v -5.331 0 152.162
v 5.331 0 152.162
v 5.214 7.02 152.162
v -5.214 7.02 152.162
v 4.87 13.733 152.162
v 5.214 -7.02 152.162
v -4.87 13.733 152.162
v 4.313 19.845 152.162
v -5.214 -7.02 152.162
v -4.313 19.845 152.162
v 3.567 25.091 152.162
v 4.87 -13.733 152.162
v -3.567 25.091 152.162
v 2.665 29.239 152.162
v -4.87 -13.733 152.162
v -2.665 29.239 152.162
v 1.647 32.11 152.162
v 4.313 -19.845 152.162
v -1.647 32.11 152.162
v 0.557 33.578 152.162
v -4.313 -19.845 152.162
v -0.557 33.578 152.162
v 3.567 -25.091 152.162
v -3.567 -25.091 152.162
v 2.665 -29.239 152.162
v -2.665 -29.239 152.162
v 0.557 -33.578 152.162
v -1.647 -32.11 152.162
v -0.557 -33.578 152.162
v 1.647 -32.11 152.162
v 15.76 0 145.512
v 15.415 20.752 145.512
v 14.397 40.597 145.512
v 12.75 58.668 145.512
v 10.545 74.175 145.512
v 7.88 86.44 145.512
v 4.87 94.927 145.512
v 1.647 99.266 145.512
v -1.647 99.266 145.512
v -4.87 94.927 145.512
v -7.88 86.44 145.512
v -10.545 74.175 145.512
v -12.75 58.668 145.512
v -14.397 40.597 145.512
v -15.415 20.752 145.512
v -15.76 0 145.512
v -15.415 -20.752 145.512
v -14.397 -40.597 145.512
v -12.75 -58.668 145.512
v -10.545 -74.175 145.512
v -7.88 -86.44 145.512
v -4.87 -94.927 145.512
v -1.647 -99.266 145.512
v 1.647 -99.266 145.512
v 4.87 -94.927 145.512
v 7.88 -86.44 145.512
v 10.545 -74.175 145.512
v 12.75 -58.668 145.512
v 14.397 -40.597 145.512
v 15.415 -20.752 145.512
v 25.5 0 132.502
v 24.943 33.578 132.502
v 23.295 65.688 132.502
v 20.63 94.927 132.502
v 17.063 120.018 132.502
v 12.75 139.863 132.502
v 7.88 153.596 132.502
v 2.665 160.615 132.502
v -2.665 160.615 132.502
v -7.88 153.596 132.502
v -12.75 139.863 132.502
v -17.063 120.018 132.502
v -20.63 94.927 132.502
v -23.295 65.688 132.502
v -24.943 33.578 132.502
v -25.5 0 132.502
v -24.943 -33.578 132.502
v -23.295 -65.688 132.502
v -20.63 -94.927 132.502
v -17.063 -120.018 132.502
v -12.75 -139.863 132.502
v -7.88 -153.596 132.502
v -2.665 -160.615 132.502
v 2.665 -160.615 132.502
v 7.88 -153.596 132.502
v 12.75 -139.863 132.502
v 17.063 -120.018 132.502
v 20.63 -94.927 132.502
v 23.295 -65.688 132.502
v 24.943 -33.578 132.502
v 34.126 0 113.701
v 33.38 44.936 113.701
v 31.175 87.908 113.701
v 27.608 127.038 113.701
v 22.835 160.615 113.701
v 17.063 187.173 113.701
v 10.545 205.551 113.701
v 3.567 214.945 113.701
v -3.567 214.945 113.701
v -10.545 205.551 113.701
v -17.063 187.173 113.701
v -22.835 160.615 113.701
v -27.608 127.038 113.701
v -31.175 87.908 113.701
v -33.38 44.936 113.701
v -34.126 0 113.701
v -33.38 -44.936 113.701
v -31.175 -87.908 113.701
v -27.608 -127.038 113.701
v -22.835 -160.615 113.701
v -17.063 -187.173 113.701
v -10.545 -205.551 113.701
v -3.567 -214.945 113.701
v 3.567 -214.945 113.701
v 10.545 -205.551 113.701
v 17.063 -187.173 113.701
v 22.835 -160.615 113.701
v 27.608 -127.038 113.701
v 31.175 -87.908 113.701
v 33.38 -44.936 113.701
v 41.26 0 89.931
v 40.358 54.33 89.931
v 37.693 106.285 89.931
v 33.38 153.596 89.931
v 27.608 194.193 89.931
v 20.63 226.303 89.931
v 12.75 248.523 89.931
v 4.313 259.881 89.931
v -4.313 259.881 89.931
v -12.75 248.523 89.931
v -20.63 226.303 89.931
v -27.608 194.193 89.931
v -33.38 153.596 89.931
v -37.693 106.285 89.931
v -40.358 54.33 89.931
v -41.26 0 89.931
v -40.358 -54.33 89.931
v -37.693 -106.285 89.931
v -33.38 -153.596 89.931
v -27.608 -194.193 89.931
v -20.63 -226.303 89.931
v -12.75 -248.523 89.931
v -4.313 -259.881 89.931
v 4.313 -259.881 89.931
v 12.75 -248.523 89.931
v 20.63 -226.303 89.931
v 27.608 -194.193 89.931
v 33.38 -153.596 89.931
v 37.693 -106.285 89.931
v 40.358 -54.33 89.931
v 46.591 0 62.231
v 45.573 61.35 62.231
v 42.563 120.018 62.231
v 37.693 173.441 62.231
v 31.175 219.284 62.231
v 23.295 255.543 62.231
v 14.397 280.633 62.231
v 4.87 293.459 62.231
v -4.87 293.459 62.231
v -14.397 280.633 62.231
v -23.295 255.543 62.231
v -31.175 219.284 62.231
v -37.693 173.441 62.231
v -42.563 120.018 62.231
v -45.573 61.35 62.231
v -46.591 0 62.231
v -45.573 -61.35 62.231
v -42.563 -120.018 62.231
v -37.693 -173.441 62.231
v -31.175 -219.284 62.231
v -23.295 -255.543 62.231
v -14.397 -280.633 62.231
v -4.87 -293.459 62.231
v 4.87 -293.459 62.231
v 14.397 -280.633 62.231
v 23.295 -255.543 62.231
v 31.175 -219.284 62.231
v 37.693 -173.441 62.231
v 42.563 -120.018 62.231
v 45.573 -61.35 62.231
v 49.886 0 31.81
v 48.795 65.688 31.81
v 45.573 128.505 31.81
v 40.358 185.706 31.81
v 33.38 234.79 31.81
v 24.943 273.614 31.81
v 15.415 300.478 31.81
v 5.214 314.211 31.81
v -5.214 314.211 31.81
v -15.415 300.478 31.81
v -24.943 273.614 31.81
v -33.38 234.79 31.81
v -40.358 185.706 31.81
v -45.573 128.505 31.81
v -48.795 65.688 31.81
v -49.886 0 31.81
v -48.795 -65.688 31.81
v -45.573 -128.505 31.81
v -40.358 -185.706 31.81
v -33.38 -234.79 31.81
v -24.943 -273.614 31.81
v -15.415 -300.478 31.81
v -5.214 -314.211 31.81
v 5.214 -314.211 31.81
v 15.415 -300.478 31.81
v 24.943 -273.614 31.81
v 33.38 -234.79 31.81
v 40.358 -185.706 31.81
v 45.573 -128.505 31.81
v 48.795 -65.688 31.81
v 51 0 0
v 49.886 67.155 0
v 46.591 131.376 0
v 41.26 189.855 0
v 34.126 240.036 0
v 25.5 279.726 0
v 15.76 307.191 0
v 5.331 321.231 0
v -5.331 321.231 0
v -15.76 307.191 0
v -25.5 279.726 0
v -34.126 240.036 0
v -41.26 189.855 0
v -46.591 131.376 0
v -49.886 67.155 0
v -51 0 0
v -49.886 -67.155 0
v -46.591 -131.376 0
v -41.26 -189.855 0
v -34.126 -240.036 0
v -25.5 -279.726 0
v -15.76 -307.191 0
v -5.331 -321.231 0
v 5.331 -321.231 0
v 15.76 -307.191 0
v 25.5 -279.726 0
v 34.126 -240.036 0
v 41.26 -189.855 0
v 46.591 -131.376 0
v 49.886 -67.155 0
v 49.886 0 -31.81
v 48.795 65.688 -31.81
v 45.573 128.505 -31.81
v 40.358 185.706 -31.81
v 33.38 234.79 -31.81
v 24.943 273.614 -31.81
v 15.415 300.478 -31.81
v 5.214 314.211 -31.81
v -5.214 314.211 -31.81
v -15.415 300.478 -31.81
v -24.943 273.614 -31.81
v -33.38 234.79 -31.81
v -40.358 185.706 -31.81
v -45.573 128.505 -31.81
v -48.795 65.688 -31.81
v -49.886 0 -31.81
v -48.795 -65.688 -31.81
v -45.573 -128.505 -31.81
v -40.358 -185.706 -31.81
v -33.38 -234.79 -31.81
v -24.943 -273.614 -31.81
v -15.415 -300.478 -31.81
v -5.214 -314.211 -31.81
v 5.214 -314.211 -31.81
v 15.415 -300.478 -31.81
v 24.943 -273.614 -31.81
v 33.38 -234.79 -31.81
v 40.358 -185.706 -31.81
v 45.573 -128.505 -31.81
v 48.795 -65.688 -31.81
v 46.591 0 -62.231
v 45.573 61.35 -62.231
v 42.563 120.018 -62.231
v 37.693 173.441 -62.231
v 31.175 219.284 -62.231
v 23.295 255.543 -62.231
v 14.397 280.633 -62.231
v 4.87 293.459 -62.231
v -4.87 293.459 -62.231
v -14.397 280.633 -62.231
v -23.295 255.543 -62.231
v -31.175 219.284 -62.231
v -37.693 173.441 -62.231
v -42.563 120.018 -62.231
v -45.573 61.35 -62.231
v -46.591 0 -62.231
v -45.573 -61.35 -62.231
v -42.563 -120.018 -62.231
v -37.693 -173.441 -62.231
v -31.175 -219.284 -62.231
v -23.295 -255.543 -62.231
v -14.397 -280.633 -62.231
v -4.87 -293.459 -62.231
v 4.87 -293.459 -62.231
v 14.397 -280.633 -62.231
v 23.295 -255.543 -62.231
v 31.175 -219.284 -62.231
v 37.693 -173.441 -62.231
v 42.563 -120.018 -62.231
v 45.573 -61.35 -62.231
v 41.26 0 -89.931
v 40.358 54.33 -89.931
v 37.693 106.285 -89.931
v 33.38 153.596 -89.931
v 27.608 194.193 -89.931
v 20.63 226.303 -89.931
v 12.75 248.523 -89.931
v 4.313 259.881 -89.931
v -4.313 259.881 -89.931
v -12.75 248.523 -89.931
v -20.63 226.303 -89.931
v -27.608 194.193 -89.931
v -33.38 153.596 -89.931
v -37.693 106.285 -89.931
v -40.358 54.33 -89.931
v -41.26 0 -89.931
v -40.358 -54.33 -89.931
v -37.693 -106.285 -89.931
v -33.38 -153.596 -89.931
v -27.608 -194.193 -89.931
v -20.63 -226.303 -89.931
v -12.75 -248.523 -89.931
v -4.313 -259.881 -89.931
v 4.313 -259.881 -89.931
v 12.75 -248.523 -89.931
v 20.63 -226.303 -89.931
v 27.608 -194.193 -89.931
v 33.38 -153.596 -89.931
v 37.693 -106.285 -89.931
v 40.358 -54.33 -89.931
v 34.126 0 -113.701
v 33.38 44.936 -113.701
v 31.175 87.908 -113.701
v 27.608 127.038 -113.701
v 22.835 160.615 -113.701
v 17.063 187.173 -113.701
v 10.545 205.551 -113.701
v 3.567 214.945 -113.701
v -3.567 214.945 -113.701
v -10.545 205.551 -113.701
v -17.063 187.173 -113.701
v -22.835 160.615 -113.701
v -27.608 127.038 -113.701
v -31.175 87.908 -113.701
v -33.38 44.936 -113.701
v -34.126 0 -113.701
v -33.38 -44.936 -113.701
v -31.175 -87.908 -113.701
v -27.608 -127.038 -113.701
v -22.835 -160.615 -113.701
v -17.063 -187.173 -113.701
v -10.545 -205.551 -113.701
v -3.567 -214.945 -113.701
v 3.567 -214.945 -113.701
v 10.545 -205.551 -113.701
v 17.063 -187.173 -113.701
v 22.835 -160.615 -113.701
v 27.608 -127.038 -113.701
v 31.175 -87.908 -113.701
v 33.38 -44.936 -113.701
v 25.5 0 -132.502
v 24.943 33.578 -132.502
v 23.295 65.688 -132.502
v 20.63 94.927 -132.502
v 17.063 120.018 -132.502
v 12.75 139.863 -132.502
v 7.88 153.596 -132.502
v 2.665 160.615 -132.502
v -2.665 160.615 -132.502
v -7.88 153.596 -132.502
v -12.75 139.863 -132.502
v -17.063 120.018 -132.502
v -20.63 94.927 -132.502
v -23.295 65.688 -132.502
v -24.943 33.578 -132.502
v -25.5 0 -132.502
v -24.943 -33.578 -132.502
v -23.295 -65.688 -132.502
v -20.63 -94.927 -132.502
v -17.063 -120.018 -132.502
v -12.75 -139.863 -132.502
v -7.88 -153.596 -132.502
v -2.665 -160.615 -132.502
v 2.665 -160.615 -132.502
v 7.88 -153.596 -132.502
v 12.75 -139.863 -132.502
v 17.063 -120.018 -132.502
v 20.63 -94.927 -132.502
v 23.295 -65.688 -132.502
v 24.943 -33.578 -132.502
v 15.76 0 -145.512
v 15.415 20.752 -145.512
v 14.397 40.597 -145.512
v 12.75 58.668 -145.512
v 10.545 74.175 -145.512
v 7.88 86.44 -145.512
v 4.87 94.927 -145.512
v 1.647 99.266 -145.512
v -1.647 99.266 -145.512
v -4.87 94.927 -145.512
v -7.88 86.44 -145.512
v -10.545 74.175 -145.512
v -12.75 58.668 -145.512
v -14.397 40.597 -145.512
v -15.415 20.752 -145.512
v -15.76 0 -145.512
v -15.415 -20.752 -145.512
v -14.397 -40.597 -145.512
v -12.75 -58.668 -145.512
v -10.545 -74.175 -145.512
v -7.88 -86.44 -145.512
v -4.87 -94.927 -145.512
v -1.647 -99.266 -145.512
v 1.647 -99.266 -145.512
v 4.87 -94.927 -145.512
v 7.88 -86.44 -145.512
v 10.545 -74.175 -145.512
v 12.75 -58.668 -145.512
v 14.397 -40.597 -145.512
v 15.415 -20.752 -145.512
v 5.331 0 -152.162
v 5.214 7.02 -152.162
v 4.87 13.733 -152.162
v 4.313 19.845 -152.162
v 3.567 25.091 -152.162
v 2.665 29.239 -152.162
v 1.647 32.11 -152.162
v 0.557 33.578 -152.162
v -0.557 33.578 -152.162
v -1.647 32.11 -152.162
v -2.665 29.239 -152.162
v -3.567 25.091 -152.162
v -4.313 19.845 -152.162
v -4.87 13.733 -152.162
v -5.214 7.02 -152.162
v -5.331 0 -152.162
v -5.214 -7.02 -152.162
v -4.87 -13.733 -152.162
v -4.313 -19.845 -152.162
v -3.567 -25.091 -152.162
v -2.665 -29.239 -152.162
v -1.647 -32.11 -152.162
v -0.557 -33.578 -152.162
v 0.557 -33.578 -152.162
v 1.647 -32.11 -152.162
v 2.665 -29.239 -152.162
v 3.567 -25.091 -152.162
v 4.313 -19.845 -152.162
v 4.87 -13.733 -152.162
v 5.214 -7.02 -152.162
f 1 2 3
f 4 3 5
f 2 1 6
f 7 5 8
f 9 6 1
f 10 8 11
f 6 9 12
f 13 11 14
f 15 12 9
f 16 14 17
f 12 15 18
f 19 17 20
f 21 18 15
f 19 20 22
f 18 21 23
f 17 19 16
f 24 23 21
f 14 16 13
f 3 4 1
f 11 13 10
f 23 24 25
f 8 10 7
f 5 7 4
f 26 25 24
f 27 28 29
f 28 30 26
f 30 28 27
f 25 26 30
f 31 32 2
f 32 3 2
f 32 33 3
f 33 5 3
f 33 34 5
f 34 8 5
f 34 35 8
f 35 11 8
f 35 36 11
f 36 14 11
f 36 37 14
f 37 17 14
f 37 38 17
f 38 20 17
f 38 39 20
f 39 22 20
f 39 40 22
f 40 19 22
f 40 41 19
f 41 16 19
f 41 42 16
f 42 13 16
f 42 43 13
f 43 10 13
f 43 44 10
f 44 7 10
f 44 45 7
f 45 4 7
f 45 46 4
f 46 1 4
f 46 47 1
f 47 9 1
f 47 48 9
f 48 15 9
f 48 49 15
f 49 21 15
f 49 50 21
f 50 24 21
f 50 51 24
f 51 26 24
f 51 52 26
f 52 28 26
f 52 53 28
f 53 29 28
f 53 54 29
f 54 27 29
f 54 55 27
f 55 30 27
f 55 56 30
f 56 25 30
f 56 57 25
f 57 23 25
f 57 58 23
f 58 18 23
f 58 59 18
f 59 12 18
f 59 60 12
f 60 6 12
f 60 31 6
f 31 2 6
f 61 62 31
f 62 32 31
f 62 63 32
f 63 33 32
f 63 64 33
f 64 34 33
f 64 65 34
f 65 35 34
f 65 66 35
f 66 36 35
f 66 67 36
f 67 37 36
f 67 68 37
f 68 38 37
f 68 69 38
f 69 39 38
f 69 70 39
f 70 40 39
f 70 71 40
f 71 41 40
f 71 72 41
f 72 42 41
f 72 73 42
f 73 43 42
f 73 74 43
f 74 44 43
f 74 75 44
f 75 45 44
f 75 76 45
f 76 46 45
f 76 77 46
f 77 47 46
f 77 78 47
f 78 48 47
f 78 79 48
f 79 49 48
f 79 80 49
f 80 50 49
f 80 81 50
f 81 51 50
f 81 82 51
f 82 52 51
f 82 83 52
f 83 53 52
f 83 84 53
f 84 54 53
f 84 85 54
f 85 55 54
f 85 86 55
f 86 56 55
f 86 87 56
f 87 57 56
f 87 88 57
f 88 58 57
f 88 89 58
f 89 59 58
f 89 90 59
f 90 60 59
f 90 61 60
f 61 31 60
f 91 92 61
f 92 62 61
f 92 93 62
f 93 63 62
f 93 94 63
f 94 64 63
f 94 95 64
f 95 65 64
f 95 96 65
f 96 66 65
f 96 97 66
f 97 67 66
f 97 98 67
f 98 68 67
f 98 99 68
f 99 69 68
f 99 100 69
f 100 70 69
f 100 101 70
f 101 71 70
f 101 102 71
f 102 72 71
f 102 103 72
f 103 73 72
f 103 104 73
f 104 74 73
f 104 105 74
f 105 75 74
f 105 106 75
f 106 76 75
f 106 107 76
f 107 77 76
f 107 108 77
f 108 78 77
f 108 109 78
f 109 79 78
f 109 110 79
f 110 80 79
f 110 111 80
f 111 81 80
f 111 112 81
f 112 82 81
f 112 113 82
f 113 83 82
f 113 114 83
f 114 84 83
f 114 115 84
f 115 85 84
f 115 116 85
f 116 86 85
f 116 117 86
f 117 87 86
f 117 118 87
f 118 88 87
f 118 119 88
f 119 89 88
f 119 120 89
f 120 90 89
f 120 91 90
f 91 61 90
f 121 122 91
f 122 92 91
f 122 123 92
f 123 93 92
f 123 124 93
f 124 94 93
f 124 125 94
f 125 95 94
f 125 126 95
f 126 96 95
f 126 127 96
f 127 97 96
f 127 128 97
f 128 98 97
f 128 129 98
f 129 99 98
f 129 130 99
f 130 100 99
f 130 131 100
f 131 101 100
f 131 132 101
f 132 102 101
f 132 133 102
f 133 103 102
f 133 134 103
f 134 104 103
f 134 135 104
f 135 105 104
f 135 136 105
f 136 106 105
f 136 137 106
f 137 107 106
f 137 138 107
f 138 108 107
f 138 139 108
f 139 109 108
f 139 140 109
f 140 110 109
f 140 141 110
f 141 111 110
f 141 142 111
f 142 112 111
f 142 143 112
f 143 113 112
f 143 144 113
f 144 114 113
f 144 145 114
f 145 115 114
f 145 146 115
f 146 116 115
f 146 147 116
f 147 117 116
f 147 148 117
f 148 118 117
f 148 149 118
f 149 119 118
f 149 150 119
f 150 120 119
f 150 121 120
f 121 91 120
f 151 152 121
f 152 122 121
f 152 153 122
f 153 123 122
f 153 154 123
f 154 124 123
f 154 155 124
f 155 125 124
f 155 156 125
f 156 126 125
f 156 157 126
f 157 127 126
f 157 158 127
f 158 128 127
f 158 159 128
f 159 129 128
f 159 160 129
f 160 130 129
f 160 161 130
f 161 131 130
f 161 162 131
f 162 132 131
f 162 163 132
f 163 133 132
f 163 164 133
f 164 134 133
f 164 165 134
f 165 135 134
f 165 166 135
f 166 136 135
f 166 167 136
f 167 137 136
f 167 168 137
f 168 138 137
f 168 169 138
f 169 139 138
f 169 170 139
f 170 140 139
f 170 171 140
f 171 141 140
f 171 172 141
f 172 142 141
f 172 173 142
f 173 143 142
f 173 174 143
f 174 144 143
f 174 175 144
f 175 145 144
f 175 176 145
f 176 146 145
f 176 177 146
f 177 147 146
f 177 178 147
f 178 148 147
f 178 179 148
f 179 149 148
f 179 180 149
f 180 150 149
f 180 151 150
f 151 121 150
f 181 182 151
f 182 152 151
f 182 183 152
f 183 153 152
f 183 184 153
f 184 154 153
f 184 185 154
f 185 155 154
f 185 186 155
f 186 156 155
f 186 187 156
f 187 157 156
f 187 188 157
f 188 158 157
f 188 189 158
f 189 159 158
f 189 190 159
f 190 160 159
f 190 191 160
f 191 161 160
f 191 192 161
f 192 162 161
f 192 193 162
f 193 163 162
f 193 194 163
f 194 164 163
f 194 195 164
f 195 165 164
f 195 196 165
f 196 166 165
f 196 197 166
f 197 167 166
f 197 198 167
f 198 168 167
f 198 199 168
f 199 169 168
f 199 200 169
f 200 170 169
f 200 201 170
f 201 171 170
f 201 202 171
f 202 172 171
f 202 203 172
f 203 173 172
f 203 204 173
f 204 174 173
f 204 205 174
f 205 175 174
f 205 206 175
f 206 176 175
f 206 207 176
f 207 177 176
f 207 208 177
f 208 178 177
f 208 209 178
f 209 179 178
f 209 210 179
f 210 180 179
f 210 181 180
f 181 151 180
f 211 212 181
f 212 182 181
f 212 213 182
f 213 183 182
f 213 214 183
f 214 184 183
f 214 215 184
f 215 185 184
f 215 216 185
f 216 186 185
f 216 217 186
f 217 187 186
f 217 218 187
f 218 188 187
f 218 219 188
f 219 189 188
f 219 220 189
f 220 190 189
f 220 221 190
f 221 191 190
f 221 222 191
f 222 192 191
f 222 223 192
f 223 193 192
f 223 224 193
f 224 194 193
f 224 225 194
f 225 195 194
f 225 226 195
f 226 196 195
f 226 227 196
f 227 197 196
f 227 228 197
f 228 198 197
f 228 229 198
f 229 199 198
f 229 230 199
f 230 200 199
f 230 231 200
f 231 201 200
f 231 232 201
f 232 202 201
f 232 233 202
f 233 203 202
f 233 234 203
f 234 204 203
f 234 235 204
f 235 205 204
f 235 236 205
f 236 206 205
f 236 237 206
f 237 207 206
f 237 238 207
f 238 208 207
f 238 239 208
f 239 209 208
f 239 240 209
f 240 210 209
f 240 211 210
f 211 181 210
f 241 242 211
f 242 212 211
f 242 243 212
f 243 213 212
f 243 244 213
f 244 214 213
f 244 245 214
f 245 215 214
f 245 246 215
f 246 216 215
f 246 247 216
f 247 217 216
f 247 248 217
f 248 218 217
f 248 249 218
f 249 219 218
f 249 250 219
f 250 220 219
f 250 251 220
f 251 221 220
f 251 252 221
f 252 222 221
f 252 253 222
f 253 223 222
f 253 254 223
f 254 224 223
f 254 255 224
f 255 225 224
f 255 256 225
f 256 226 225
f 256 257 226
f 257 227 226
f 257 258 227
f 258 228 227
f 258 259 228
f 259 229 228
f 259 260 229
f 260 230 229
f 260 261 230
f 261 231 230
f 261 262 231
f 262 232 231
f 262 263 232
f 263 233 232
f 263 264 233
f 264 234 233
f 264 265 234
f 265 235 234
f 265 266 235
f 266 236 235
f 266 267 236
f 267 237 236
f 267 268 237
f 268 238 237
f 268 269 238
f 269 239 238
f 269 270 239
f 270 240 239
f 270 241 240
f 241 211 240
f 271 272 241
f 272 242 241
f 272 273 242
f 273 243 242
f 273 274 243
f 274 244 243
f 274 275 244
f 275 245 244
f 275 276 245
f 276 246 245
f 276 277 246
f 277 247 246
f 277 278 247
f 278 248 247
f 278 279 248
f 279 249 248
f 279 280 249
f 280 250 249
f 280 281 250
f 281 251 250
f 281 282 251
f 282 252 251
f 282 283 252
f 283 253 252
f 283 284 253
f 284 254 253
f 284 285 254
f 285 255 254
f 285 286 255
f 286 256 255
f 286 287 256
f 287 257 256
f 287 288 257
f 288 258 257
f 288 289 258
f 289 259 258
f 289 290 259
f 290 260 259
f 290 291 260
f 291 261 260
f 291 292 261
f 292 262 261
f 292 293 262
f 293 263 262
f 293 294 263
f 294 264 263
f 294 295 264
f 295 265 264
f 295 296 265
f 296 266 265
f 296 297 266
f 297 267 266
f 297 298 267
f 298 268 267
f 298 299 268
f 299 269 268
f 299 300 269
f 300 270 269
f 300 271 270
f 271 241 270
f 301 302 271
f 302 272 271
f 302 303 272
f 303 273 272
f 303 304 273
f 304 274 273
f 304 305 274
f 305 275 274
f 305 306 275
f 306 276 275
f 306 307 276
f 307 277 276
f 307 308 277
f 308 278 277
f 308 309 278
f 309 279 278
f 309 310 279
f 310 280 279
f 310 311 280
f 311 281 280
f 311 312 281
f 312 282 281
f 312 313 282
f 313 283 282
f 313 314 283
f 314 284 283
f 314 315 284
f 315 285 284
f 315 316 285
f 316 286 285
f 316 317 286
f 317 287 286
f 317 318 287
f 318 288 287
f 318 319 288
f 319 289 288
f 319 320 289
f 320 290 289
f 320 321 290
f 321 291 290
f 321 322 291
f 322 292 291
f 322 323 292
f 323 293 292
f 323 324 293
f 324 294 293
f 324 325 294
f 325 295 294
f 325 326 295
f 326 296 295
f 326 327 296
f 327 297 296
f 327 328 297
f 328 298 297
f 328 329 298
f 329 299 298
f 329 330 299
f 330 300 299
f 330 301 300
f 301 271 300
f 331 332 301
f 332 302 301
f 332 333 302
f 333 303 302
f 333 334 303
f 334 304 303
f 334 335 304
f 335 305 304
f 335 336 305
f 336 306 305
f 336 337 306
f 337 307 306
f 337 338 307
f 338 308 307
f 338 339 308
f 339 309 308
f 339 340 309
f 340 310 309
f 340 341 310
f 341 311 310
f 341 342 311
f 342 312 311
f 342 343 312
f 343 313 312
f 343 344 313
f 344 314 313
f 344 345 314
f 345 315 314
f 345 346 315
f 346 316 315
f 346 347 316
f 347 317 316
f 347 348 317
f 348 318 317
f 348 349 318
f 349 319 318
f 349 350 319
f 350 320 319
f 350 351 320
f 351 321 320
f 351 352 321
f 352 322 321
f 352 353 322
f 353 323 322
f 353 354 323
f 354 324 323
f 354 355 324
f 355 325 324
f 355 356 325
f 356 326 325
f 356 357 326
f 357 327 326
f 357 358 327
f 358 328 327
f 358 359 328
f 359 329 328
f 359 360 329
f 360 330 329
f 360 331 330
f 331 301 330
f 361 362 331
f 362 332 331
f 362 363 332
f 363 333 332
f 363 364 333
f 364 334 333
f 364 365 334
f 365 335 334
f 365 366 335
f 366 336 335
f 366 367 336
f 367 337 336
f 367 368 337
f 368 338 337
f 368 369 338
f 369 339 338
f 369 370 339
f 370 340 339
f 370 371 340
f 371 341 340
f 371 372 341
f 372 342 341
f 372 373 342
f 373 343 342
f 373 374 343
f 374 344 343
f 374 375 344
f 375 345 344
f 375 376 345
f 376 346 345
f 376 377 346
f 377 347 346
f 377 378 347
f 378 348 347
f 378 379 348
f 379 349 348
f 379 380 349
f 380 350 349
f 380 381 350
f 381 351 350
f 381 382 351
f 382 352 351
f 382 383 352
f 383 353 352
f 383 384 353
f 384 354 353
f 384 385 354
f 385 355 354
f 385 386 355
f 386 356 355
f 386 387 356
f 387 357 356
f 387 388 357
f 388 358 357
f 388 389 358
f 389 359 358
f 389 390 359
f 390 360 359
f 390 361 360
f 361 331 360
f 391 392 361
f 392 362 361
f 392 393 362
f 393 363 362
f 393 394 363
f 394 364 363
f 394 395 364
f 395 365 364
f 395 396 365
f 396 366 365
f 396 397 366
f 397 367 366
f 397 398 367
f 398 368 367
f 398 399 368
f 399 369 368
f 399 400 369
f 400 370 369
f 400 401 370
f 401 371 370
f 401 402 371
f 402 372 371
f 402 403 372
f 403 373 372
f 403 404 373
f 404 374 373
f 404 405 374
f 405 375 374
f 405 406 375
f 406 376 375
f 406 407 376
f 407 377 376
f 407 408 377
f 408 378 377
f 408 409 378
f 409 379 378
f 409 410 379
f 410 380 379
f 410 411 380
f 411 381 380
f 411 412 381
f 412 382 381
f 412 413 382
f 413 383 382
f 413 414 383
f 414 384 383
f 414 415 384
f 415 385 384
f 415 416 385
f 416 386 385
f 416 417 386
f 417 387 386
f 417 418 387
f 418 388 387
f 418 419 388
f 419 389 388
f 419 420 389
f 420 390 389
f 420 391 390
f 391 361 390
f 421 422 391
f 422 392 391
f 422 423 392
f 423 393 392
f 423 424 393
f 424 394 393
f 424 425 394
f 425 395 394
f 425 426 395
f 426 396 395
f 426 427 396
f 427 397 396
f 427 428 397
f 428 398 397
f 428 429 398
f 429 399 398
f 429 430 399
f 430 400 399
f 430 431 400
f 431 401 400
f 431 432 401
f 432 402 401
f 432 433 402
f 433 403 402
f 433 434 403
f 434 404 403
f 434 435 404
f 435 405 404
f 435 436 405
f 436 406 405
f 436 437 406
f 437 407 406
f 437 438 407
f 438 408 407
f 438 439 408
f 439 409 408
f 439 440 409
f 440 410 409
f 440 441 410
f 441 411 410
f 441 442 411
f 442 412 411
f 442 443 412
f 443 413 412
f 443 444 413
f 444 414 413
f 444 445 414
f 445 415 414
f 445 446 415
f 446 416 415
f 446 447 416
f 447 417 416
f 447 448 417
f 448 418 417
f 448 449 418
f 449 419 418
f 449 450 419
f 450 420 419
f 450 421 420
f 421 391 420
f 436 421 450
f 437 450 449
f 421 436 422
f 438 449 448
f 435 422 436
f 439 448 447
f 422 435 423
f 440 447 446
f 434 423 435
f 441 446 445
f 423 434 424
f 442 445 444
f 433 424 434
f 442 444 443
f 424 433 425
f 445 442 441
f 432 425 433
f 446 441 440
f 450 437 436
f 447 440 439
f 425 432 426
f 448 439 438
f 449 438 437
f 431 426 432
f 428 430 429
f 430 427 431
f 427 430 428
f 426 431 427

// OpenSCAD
// Generated by SolidPython 1.0.1 on 2020-07-29 00:46:46


scale(v = [3, 19, 9]) {
	sphere(r = 17);
}
/***********************************************
*********      SolidPython code:      **********
************************************************
 
# import packages: SolidPython
from solid import *
from solid.utils import *
from itertools import chain, combinations, permutations


class Resize:

    def __init__(self, scad_file):
        self.scad_file = scad_file
        #self.scad_file = import_scad(scad_file)
        # cone/cylinder param:
        self.r1 = 0
        self.r2 = 0
        self.h = 0
        # rectangular prism param:
        self.w = 0
        self.l = 0
        # ellipse param:
        self.r = 0

    # import OpenScad code (file name corresponds to shape)


    # classify shape + parameters
    def assign(self, param1, param2, param3):
        if self.scad_file == 'cone.scad':
            self.r1 = param1
            self.r2 = param2
            self.h = param3
        elif self.scad_file == 'cylinder.scad':
            self.r1 = param1
            self.r2 = param2
            self.h = param3
        elif self.scad_file == 'rectangularPrism.scad':
            self.h = param1
            self.l = param2
            self.w = param3
        else:
            self.r = param1
            self.h = param2

    # resize parameters
    def iterate(self):
        x = range(3, 20, 2)
        i = 1
        if self.scad_file == 'cone.scad':
            tempList = list(permutations(x, 2))
            for temp in tempList:
                param1 = temp[0]
                param2 = temp[1]
                filepath = 'produced_scad_files/' + 'cone' + str(param1) + '_' + str(param2) + '_' + '.scad'
                scad_render_to_file(cylinder(h=param1, r1=param2, r2=0), filepath)

        elif self.scad_file == 'cylinder.scad':
            tempList = list(permutations(x, 3))
            for temp in tempList:
                param1 = temp[0]
                param2 = temp[1]
                filepath = 'produced_scad_files/' + 'cylinder' + str(param1) + '_' + str(param2) + '_' + '.scad'
                scad_render_to_file(cylinder(h=param1, r1=param2, r2=param2), filepath)

        elif self.scad_file == 'rectangularPrism.scad':
            tempList = list(permutations(x, 3))
            for temp in tempList:
                param1 = temp[0]
                param2 = temp[1]
                param3 = temp[2]
                filepath = 'produced_scad_files/' + 'rectangularPrism' + str(param1) + '_' + str(param2) + '_' + str(
                    param3) + '.scad'
                scad_render_to_file(cube(size=(param1, param2, param3)), filepath)

        elif self.scad_file == 'ellipse.scad':
            tempList = list(permutations(x, 4))
            for temp in tempList:
                param1 = temp[0]
                param2 = temp[1]
                param3 = temp[2]
                param4 = temp[3]
                filepath = 'produced_scad_files/' + 'ellipse' + str(param1) + '_' + str(param2) + '_' + str(param3) + '_' + str(param4) + '.scad'
                scad_render_to_file(scale([param1, param2, param3])(sphere(r=param4)), filepath)

    def render_to_scadfile(self):
        scad_render_to_file(scad, 'example.scad') 
 
************************************************/
